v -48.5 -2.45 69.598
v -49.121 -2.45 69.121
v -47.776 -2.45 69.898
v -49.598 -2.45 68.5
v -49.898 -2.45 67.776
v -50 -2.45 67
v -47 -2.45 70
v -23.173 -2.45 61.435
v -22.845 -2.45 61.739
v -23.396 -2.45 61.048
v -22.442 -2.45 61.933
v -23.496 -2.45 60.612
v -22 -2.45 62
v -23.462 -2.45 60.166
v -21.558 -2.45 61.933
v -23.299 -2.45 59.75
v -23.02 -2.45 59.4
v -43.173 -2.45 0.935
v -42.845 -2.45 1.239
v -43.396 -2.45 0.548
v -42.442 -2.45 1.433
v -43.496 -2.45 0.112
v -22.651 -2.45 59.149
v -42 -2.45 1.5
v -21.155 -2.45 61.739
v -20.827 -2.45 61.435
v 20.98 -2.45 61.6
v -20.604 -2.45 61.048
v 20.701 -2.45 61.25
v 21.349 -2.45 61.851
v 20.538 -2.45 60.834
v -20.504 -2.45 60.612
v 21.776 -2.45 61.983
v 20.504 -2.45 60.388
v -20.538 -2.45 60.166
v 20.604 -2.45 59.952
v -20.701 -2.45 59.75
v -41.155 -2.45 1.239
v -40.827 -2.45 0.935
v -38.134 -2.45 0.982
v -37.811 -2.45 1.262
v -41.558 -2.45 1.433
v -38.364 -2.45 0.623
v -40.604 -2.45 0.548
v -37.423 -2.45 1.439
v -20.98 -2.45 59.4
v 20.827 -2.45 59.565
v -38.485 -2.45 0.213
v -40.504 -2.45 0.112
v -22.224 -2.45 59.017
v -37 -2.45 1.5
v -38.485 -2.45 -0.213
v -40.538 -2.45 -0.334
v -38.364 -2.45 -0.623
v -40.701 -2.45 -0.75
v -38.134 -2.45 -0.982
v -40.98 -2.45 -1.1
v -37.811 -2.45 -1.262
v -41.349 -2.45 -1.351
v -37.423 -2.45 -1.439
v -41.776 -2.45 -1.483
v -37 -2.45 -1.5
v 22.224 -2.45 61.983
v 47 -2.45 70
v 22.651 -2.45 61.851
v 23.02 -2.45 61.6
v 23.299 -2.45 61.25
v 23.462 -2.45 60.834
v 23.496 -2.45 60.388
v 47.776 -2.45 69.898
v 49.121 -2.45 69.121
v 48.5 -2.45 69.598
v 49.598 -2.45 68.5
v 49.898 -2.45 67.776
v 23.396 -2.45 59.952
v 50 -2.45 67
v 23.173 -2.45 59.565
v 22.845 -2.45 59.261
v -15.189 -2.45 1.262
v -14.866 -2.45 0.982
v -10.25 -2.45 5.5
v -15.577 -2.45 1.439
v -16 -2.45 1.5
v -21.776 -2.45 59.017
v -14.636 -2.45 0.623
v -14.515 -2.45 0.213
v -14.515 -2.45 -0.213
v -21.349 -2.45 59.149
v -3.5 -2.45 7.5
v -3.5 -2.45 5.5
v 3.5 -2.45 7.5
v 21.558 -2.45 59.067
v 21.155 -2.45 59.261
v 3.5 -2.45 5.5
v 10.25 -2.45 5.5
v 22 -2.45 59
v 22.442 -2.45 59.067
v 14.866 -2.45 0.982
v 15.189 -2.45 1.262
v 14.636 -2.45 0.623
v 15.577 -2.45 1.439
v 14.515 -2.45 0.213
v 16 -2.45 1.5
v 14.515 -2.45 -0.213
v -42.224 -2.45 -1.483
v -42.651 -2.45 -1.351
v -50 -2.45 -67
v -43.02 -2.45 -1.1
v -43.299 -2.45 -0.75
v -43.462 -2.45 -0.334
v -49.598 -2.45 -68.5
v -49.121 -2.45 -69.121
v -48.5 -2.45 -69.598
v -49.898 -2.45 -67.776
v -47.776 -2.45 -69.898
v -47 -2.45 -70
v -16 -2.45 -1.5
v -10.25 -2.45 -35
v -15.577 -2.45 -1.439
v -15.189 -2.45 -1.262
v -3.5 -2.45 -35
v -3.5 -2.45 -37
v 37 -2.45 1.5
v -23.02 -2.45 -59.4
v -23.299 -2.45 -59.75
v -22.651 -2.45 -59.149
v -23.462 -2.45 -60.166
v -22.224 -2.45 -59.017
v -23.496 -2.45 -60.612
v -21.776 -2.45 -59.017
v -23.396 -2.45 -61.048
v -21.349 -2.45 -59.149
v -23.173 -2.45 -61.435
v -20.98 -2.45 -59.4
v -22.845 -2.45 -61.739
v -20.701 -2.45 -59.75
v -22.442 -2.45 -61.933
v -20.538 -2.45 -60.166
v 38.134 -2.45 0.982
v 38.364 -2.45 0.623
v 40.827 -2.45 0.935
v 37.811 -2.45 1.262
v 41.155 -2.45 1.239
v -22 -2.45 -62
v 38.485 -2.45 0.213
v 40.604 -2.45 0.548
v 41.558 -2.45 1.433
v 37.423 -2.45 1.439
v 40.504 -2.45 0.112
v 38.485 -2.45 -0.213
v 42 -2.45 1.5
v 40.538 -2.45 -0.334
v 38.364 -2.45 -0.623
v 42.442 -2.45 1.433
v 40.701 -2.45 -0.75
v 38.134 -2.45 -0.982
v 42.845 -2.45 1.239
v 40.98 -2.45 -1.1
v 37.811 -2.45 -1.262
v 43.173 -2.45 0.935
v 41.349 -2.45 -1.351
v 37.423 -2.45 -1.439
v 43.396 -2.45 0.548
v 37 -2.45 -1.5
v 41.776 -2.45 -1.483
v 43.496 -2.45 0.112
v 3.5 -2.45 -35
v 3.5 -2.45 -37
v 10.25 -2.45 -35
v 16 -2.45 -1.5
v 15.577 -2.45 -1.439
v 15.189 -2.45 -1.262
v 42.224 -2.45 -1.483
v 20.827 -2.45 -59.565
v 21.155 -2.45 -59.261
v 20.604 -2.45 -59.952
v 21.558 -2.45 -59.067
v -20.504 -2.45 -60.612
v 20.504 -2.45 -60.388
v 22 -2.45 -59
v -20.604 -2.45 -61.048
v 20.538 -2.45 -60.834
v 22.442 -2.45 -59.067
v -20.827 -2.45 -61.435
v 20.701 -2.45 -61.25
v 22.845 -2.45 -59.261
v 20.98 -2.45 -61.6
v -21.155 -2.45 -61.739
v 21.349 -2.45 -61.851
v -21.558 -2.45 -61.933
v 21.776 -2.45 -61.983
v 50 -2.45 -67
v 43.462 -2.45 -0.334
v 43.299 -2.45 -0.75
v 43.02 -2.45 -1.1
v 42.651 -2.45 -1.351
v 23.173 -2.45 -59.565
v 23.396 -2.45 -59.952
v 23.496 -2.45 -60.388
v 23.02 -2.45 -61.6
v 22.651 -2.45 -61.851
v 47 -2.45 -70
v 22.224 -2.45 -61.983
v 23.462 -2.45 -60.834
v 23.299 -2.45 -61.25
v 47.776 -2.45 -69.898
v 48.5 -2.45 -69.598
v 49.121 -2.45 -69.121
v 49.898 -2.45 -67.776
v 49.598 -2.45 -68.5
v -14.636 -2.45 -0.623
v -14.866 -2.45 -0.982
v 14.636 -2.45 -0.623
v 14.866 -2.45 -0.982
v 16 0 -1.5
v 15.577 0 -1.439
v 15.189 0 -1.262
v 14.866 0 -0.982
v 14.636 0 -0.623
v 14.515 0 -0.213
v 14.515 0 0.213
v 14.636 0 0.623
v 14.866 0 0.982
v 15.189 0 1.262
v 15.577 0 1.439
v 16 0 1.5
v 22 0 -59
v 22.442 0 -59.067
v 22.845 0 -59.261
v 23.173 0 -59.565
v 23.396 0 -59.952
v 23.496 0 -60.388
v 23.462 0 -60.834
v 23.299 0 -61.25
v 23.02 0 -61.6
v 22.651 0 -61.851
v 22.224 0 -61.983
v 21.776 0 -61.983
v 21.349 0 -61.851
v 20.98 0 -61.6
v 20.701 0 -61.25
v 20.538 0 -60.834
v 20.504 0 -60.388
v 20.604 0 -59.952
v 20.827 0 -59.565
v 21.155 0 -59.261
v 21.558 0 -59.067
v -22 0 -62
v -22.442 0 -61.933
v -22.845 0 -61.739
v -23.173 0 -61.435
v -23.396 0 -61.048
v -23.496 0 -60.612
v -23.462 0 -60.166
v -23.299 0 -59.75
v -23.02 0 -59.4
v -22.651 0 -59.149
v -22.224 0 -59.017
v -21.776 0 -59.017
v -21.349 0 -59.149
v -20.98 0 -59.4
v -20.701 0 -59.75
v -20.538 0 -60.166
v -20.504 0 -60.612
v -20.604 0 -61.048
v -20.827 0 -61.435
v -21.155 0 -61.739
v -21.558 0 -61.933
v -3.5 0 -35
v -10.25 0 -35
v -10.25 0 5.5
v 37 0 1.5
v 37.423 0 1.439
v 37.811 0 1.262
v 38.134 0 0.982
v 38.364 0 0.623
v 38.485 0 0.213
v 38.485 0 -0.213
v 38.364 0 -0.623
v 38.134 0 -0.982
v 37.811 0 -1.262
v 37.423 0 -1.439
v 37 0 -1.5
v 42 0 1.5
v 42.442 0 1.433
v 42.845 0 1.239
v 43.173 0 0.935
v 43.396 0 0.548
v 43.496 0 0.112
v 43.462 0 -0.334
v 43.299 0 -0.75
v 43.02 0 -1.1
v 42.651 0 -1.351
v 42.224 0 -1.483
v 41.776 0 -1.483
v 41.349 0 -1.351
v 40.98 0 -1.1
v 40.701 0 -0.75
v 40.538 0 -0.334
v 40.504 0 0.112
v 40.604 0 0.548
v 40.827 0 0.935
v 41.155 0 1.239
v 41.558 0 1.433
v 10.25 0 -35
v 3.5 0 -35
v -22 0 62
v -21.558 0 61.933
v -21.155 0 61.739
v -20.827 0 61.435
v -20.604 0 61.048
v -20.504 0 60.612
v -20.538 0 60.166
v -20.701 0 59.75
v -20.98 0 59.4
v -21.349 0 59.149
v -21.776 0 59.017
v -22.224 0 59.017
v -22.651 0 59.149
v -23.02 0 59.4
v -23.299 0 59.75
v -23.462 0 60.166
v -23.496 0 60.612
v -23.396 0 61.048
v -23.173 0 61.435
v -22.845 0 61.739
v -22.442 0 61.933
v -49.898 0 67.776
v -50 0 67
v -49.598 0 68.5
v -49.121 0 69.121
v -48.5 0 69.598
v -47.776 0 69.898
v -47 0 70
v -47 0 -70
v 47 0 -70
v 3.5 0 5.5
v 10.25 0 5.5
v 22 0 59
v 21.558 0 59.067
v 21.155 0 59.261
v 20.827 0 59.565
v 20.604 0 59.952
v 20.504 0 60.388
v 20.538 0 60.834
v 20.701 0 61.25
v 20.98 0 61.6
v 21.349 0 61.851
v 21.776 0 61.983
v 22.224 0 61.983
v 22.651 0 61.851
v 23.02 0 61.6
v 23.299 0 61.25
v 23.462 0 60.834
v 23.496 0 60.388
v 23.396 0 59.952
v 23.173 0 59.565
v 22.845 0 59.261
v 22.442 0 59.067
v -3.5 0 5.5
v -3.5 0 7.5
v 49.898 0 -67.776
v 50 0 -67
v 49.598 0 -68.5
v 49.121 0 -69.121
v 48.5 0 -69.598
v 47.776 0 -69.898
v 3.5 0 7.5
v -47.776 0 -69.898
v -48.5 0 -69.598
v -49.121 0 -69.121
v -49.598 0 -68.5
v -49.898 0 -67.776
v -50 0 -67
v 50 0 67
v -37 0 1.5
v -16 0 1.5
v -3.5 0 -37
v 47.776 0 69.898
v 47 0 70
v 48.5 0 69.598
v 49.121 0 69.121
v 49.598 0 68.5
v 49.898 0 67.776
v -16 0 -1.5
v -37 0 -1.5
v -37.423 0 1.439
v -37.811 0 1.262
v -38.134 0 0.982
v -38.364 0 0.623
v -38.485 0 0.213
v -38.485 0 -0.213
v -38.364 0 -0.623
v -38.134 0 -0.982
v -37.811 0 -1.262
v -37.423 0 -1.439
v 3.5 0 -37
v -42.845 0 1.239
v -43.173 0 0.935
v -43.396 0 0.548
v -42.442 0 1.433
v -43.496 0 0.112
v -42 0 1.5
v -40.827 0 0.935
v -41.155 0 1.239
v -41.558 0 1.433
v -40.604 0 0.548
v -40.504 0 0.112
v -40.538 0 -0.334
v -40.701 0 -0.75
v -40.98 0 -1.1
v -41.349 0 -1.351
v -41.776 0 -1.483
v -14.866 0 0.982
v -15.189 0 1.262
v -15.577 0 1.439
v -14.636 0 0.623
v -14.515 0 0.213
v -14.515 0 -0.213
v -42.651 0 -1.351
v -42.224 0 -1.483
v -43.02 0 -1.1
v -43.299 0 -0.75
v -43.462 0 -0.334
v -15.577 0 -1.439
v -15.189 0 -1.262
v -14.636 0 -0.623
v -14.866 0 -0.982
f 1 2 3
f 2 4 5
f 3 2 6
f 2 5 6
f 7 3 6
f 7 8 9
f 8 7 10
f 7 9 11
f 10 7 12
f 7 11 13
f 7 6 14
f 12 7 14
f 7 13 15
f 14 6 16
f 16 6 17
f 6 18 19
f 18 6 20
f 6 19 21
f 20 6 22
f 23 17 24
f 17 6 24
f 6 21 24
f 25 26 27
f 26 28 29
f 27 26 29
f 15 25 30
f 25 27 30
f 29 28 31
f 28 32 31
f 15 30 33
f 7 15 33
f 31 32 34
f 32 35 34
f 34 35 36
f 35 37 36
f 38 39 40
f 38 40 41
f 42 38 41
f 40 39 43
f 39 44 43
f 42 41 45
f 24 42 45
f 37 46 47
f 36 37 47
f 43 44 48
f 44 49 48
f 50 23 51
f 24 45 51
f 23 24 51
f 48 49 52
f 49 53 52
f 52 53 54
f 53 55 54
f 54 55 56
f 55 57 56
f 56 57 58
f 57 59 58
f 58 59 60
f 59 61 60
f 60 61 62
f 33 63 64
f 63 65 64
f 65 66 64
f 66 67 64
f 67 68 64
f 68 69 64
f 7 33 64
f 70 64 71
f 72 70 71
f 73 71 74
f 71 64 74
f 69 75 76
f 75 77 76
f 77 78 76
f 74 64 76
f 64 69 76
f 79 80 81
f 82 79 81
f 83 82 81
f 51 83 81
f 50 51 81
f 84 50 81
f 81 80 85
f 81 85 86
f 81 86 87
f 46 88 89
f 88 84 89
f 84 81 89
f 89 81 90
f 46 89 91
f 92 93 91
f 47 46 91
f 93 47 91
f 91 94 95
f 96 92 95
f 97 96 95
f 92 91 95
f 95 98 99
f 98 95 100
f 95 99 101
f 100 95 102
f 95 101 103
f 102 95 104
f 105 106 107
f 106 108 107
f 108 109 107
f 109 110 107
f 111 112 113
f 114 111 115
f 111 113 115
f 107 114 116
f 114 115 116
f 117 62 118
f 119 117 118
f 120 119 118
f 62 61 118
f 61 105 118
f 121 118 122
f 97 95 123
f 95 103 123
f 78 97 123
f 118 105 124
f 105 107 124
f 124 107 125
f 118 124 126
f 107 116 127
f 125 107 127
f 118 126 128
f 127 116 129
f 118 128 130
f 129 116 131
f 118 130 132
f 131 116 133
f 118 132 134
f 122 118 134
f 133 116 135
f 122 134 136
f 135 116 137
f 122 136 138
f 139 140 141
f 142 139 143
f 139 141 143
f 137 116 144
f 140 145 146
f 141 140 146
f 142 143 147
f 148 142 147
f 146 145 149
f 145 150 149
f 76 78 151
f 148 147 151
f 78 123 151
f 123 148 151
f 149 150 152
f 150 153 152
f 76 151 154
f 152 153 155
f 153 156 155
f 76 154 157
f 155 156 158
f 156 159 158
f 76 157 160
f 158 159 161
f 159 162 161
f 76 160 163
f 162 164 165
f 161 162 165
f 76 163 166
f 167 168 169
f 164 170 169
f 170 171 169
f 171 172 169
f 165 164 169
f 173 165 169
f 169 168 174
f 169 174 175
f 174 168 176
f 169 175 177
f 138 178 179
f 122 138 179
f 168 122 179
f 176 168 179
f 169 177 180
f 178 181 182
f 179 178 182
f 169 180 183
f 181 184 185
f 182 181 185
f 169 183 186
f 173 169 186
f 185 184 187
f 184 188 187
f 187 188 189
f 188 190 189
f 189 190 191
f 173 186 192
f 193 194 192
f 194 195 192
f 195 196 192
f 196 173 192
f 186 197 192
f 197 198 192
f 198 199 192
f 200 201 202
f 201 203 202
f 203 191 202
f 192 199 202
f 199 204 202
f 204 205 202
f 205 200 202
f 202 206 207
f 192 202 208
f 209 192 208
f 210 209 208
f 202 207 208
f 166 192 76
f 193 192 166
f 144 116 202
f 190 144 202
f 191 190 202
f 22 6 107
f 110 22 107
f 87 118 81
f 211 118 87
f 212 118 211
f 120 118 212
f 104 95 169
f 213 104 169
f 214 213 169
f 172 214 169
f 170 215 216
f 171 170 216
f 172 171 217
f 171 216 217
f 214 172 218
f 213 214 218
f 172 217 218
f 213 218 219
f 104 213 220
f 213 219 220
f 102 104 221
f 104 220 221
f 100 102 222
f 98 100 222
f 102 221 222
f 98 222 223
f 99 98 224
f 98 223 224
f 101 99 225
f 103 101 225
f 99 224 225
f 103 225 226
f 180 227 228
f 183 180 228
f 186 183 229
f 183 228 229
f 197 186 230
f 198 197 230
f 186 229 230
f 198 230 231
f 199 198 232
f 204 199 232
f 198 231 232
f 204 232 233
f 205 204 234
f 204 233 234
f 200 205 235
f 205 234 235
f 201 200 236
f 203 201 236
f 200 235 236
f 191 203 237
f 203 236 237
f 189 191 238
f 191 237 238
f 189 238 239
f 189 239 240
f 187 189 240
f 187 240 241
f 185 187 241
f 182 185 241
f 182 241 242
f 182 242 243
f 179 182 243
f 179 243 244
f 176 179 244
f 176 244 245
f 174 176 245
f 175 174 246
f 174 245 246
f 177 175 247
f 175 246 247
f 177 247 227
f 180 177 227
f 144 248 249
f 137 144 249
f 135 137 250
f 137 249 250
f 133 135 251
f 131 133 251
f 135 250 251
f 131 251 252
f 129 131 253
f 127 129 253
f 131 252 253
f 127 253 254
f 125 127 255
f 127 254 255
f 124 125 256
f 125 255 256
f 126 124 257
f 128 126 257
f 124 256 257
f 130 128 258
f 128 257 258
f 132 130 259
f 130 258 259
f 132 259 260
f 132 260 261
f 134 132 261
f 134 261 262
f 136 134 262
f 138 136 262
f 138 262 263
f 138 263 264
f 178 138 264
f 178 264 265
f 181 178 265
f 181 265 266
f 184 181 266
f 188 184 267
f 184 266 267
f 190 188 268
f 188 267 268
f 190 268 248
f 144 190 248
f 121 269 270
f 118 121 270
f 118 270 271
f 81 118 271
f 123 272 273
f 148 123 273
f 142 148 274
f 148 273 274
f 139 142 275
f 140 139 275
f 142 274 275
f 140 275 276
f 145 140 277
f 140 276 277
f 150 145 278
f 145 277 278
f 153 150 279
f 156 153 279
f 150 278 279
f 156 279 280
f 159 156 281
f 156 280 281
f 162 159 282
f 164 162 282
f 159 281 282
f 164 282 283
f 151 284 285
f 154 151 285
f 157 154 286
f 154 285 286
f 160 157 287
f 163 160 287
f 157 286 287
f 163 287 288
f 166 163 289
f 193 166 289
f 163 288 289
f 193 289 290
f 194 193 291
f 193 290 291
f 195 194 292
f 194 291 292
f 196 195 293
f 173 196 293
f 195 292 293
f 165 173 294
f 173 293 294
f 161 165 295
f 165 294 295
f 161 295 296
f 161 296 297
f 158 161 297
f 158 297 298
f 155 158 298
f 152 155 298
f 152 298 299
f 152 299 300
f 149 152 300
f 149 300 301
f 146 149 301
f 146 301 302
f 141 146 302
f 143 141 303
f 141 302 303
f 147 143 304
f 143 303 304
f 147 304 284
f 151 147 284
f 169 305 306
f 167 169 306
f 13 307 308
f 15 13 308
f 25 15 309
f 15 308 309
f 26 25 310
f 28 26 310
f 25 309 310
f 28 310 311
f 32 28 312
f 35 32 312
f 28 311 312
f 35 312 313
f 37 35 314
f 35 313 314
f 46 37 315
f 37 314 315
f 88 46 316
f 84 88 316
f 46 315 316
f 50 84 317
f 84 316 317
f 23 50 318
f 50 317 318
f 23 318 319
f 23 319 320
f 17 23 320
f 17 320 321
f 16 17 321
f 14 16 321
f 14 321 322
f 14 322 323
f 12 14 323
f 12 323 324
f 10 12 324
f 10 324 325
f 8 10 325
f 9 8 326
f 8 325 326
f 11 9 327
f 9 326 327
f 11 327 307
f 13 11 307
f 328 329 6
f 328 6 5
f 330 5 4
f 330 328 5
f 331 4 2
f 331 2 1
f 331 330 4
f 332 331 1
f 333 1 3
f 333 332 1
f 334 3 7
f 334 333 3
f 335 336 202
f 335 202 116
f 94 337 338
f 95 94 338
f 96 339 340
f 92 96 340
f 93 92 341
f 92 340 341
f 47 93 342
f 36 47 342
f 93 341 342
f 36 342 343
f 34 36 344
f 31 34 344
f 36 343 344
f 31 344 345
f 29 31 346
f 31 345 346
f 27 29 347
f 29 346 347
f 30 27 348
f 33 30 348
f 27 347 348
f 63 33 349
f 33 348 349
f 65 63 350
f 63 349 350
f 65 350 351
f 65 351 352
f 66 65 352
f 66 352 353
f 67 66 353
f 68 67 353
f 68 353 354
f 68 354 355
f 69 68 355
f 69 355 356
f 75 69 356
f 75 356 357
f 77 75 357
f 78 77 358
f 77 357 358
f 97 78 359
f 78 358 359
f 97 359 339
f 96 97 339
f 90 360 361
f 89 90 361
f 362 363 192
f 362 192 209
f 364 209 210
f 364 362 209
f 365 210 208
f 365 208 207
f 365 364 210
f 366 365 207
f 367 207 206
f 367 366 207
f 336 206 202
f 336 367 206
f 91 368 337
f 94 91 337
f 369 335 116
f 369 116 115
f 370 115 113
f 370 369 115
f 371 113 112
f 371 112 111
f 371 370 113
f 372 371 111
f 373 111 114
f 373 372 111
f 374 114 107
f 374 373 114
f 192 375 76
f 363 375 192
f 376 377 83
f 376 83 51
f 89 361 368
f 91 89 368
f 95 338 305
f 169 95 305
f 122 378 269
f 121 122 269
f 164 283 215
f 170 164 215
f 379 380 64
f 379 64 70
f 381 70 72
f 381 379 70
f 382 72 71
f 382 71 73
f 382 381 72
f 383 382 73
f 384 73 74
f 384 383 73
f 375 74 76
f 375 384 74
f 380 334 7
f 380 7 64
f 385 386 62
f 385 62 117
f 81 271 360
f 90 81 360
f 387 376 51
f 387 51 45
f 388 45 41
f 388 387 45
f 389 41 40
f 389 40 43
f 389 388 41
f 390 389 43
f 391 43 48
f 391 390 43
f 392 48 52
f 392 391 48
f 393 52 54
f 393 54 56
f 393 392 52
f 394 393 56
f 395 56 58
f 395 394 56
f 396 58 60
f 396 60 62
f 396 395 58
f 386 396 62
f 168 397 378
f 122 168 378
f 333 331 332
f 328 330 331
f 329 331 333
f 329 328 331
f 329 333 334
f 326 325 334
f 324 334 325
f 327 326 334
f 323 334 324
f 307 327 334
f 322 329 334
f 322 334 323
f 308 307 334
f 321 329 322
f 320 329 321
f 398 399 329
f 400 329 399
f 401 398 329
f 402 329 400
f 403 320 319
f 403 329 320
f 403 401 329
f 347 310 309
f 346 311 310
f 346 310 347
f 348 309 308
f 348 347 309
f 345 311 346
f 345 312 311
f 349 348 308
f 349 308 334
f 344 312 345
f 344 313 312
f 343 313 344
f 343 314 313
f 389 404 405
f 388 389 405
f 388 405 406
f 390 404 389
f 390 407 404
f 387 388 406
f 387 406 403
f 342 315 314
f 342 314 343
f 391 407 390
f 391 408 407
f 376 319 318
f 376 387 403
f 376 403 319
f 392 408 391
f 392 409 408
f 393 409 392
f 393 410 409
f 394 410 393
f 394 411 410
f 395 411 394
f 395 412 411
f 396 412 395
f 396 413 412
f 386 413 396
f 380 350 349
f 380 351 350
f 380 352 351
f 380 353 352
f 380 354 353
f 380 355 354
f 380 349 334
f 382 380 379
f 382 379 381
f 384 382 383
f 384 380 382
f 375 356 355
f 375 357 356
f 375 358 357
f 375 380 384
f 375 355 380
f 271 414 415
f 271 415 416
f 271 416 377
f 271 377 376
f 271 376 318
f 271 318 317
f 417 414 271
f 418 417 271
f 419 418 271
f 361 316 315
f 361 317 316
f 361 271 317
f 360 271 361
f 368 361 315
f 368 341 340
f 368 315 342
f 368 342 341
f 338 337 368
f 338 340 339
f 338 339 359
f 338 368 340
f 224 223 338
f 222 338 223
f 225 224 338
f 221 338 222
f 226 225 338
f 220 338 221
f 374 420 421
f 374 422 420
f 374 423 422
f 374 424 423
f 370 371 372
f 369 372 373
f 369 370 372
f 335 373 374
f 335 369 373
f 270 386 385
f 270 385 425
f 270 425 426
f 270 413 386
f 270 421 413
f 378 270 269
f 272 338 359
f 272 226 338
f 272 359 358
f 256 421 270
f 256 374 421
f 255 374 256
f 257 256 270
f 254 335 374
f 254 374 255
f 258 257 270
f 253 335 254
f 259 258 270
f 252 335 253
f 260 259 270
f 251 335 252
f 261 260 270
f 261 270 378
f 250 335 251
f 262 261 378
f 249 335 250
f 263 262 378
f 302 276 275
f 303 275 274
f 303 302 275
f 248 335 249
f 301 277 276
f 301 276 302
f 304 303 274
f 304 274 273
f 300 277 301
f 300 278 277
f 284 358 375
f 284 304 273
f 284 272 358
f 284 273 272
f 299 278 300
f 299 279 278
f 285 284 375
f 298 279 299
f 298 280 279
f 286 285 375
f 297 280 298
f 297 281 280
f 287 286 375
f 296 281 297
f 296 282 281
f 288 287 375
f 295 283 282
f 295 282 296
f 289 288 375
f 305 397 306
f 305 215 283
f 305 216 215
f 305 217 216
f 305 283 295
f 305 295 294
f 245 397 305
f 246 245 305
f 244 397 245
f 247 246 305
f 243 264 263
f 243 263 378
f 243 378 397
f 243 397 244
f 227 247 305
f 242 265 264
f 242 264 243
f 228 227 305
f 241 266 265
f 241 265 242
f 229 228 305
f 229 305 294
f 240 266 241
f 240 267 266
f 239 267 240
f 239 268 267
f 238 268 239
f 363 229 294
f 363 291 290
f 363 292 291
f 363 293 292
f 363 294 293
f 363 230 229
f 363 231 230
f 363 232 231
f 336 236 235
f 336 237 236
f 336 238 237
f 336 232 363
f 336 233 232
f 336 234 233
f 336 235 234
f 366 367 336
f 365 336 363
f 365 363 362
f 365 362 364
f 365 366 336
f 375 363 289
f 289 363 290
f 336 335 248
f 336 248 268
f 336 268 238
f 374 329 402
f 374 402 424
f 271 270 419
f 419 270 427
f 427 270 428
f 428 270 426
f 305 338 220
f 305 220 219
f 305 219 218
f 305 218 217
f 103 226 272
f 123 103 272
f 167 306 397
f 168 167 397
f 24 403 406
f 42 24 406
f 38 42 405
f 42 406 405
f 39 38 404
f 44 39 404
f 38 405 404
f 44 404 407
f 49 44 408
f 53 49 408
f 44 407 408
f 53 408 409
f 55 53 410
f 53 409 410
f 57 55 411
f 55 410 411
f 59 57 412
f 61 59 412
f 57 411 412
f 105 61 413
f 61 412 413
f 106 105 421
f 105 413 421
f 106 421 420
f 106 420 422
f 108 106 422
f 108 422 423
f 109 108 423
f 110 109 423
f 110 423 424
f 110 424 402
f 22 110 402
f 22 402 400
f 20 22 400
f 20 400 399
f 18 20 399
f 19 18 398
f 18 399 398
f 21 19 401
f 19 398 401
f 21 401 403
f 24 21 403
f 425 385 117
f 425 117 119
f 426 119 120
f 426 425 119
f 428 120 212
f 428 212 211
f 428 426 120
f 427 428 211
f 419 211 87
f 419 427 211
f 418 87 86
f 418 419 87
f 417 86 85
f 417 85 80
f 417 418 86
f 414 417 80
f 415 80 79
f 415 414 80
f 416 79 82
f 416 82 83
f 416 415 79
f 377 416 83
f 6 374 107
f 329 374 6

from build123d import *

# Parameters (mm, degrees)
BASE_FLANGE2_DEPTH = 2.45
SKETCH10_R         = 1.5
CUT_EXTRUDE1_DEPTH = 2.45


# Sheet-metal steps are written as plain solids
with BuildPart() as part:
    # Sketch2 → Base-Flange2 (new body)
    with BuildSketch(Plane(origin=(0, 0, 0), x_dir=(1, 0, 0), z_dir=(0, 1, 0))):
        with BuildLine():
            Line((-47, -70), (47, -70))
            ThreePointArc((47, -70), (49.121320344, -69.121320344), (50, -67))
            Line((50, -67), (50, 67))
            ThreePointArc((50, 67), (49.121320344, 69.121320344), (47, 70))
            Line((47, 70), (-47, 70))
            ThreePointArc((-47, 70), (-49.121320344, 69.121320344), (-50, 67))
            Line((-50, 67), (-50, -67))
            ThreePointArc((-50, -67), (-49.121320344, -69.121320344), (-47, -70))
        make_face()
    extrude(amount=-BASE_FLANGE2_DEPTH)

    # Sketch10 → Cut-Extrude1 (cut)
    with BuildSketch(Plane(origin=(0, 0, 0), x_dir=(1, 0, 0), z_dir=(0, 1, 0))):
        with Locations(Location((42, 0, 0), (0, 0, 270))):
            Circle(SKETCH10_R)
        with Locations(Location((-42, 0, 0), (0, 0, 270))):
            Circle(SKETCH10_R)
        with Locations(Location((22, 60.5, 0), (0, 0, 270))):
            Circle(SKETCH10_R)
        with Locations(Location((-22, 60.5, 0), (0, 0, 90))):
            Circle(SKETCH10_R)
        with Locations(Location((22, -60.5, 0), (0, 0, 90))):
            Circle(SKETCH10_R)
        with Locations(Location((-22, -60.5, 0), (0, 0, 270))):
            Circle(SKETCH10_R)
        Polygon((-10.25, -5.5), (-3.5, -5.5), (-3.5, -7.5), (3.5, -7.5), (3.5, -5.5), (10.25, -5.5), (10.25, 35), (3.5, 35), (3.5, 37), (-3.5, 37), (-3.5, 35), (-10.25, 35), align=None)
        with BuildLine():
            Line((-37, 1.5), (-16, 1.5))
            ThreePointArc((-16, 1.5), (-14.5, 0), (-16, -1.5))
            Line((-16, -1.5), (-37, -1.5))
            ThreePointArc((-37, -1.5), (-38.5, 0), (-37, 1.5))
        make_face()
        with BuildLine():
            Line((37, 1.5), (16, 1.5))
            ThreePointArc((16, 1.5), (14.5, 0), (16, -1.5))
            Line((16, -1.5), (37, -1.5))
            ThreePointArc((37, -1.5), (38.5, 0), (37, 1.5))
        make_face()
    extrude(amount=-CUT_EXTRUDE1_DEPTH, mode=Mode.SUBTRACT)


solid = part.part
